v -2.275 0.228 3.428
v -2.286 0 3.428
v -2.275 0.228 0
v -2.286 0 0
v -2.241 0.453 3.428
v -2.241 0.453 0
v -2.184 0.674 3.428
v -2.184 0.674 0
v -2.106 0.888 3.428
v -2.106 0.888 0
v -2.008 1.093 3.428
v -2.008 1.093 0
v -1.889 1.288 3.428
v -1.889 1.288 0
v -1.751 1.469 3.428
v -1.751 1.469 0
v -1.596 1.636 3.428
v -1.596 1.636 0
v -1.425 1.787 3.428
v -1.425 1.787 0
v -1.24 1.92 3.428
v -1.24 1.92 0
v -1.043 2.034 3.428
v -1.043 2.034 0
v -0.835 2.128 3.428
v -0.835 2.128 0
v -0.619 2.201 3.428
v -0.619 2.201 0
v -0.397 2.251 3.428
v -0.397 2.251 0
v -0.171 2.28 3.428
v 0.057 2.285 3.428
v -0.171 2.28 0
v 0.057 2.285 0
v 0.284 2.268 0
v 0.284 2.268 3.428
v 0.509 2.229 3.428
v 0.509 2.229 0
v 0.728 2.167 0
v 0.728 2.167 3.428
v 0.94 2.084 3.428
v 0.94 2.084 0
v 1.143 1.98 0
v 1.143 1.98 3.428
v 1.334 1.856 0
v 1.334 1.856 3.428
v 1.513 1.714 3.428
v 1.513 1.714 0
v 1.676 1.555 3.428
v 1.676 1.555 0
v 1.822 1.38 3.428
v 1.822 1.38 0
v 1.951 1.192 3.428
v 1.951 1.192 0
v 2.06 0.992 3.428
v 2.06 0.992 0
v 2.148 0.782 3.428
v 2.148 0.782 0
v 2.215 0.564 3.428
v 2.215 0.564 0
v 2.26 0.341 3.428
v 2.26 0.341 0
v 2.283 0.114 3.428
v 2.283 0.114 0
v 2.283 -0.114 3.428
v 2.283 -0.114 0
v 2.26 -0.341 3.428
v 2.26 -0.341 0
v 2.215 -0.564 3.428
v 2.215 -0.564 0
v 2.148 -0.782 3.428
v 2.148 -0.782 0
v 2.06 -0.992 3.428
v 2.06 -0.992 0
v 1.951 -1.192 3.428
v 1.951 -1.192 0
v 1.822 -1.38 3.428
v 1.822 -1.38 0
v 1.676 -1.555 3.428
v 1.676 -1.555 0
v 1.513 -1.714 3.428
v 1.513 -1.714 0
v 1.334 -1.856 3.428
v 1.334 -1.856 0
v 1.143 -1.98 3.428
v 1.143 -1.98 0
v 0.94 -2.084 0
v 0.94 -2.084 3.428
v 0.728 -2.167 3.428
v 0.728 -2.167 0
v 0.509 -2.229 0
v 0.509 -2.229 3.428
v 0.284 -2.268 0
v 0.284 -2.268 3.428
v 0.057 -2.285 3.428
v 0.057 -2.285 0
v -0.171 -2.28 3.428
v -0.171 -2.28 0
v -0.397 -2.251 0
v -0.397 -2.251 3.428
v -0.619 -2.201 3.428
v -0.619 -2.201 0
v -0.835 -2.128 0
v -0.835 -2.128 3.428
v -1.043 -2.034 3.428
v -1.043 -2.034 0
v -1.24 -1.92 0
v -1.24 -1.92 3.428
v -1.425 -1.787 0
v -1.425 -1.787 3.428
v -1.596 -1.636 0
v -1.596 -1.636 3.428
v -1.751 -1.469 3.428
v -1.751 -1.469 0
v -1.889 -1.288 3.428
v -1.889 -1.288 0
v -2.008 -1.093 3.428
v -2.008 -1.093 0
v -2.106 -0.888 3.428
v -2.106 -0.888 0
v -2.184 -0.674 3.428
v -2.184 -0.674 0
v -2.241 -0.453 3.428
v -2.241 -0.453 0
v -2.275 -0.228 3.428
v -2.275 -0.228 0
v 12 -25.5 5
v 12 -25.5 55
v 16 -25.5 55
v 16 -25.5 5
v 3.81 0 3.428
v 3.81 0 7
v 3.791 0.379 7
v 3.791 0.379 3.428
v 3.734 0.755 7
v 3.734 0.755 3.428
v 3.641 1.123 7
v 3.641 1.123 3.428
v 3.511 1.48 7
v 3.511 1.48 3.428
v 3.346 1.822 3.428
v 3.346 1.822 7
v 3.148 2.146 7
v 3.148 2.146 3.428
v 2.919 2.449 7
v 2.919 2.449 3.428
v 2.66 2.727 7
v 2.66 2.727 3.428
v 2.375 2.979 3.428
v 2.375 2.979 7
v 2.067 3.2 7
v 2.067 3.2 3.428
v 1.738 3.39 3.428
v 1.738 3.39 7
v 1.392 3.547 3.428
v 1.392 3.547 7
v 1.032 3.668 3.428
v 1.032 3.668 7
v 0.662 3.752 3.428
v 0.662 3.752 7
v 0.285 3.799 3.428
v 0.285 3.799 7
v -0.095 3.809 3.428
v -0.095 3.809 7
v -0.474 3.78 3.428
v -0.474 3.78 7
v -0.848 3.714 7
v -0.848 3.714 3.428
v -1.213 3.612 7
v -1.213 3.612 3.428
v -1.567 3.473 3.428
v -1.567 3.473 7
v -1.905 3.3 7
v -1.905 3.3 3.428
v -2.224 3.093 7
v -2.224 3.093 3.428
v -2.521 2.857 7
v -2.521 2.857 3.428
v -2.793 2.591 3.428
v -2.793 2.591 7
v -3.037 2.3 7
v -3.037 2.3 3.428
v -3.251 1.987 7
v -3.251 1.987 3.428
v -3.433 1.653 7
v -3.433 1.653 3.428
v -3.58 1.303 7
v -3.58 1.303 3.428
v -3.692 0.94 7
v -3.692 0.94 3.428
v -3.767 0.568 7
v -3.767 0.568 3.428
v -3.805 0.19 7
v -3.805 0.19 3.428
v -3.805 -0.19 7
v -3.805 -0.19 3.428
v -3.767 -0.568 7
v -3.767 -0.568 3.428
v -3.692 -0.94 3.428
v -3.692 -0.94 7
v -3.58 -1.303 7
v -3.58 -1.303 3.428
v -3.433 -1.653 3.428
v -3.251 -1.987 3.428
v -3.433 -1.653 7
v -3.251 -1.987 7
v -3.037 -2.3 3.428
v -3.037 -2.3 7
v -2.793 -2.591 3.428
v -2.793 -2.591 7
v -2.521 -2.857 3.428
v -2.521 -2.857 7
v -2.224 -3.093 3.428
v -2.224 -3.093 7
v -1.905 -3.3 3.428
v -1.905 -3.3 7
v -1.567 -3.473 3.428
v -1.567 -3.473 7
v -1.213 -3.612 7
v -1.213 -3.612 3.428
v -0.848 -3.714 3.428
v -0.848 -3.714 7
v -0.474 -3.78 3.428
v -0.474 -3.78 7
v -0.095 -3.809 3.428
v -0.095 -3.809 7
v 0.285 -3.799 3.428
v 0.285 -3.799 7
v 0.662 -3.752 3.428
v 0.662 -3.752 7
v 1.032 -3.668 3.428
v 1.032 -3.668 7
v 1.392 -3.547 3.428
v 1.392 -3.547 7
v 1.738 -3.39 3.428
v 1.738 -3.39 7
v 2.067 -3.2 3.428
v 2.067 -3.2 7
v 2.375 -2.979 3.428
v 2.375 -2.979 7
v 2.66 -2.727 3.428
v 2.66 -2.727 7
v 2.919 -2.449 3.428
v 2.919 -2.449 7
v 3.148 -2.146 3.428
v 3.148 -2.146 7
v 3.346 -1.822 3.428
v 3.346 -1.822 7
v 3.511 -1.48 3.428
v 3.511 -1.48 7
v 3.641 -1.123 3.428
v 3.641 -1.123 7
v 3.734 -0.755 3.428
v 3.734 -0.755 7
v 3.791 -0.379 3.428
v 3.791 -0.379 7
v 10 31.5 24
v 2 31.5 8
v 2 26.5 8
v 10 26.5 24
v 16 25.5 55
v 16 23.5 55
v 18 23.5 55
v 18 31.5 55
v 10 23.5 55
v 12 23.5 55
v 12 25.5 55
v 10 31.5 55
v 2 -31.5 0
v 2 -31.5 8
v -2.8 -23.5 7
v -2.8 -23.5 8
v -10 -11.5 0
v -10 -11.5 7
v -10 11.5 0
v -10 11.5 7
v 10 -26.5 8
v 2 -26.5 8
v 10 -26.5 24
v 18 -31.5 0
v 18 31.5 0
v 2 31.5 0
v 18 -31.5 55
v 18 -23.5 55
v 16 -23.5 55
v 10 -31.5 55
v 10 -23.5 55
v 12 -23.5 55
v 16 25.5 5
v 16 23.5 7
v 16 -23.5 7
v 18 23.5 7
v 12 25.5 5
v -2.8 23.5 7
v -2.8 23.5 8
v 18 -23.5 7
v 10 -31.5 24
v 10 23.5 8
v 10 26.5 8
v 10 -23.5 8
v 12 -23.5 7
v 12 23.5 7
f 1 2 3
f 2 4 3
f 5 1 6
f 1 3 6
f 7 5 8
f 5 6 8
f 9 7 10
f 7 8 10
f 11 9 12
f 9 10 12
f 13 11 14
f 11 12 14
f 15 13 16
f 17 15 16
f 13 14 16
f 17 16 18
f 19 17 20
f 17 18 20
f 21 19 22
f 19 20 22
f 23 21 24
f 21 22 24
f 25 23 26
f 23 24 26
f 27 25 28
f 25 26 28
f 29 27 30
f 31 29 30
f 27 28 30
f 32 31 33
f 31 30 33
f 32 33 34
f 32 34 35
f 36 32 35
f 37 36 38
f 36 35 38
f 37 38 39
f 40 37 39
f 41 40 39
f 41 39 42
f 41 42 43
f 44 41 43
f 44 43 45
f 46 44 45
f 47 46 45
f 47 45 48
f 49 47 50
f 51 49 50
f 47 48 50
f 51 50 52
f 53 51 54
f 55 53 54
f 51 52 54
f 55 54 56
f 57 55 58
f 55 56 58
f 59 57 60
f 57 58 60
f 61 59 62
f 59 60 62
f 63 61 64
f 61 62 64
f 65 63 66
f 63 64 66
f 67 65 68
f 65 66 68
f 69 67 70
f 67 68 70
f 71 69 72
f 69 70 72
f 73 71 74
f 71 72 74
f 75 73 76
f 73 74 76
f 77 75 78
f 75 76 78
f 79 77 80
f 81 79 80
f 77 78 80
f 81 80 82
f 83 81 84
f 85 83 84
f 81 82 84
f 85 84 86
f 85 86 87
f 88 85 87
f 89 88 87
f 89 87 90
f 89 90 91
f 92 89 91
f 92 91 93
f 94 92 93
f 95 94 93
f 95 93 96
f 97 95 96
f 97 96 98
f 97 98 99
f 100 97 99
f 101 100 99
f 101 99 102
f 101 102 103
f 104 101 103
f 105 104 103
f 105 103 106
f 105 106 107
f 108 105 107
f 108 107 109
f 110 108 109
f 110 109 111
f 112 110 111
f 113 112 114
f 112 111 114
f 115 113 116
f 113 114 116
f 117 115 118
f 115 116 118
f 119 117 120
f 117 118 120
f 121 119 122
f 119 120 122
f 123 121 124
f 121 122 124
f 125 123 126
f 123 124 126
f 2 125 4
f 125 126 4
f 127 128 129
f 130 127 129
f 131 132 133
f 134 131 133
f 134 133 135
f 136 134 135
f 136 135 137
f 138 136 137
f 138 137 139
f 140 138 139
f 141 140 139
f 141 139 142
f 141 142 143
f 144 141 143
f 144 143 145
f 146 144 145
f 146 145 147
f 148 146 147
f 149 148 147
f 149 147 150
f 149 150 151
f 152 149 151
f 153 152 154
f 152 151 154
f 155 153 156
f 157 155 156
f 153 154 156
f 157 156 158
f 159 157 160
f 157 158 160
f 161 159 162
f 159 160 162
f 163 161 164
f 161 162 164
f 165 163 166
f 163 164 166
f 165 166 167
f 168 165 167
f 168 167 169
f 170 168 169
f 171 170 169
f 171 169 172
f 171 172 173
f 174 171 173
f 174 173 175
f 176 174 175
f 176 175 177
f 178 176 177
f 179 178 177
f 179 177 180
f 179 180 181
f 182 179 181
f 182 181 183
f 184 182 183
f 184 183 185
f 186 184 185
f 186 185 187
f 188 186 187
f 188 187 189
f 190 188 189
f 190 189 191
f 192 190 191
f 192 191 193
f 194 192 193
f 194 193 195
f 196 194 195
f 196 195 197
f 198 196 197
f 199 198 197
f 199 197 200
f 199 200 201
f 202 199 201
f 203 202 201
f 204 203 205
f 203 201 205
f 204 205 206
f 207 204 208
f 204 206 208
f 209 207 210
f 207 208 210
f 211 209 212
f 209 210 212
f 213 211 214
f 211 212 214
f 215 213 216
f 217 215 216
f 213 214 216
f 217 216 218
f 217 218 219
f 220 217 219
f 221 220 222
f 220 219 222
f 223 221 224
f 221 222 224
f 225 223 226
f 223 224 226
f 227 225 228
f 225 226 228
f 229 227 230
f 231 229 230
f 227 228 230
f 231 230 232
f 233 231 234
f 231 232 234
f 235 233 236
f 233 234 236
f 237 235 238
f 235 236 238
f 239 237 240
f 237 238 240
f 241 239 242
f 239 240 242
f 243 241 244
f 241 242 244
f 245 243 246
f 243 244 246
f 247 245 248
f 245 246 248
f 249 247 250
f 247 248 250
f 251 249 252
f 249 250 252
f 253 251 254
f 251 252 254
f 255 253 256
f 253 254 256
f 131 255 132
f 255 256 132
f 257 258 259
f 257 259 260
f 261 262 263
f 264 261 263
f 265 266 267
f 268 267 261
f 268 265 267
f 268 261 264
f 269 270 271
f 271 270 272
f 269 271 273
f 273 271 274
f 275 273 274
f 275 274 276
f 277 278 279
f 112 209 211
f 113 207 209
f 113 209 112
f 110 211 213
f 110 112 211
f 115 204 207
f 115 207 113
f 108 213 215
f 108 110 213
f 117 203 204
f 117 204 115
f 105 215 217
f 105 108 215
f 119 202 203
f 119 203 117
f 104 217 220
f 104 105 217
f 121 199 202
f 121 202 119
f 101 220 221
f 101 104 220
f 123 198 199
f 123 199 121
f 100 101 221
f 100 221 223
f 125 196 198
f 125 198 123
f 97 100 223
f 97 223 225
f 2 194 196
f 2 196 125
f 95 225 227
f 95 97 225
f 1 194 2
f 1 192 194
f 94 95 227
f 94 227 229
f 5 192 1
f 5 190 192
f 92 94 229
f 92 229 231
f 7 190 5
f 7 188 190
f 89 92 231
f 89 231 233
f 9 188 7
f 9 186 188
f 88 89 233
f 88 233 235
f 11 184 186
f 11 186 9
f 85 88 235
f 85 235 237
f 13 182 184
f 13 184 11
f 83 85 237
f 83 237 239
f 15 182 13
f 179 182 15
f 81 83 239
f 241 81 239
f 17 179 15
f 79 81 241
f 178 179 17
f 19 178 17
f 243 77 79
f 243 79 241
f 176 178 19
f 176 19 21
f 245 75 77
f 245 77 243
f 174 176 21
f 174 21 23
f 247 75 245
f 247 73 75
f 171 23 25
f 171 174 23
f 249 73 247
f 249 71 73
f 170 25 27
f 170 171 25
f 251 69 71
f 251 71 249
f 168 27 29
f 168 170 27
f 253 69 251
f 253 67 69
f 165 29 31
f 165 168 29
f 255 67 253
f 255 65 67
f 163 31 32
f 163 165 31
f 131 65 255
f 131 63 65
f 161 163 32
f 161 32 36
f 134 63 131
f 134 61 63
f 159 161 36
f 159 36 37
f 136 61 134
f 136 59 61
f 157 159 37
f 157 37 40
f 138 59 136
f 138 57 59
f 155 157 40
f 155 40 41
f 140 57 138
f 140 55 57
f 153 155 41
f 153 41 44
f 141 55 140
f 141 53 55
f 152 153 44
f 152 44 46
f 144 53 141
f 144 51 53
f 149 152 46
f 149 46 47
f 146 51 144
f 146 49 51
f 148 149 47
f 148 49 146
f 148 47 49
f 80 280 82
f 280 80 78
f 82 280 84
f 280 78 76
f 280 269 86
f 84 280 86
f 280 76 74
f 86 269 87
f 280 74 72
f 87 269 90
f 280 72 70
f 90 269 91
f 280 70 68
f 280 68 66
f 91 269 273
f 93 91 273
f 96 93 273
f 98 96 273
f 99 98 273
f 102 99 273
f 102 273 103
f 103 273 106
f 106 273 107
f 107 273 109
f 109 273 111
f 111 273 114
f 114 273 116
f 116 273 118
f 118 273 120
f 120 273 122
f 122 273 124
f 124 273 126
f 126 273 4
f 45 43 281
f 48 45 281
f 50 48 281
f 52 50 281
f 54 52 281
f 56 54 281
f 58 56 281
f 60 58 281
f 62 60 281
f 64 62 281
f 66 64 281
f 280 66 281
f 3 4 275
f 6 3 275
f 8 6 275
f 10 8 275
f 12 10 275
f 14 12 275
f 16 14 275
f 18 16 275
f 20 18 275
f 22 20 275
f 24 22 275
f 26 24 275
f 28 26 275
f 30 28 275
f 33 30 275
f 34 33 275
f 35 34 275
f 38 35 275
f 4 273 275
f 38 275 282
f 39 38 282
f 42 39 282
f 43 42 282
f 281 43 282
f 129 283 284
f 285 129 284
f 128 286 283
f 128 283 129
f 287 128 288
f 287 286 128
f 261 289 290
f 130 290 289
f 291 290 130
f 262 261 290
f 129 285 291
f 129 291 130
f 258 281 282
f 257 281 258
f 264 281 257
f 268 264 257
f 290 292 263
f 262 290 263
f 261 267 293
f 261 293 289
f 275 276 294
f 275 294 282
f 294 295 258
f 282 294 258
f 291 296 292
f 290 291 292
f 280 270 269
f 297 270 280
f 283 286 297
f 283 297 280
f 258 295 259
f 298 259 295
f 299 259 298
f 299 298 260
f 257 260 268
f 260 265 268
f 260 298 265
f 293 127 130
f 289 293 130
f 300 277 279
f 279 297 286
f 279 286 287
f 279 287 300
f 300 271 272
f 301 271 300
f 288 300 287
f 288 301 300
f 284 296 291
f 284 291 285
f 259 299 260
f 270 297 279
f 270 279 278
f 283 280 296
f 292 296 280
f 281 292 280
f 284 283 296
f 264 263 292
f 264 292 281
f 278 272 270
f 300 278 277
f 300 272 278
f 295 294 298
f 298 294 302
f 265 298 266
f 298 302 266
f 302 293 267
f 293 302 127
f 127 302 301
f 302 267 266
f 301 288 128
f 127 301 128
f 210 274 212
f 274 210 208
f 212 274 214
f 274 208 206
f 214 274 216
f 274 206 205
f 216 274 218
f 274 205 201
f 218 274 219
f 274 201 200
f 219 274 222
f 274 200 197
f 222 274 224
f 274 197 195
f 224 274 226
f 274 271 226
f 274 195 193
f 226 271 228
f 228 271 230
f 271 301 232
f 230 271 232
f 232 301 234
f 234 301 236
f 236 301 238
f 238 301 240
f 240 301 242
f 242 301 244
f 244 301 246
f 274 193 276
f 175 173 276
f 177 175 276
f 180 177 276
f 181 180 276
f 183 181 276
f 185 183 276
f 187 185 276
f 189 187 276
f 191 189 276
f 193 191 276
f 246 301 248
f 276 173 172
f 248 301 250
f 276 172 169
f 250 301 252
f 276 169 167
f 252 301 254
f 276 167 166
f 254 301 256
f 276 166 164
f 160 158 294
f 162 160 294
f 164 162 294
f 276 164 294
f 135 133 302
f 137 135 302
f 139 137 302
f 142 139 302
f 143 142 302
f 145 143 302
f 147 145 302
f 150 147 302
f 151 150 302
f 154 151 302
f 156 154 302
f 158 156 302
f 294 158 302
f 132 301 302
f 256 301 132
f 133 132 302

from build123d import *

# Parameters (mm, degrees)
F0_W           = 20
F0_H           = 63
F1_DEPTH       = 8
F2_W           = 63
F2_H           = 55
F3_DEPTH       = 8
F5_D           = 4.572
F5_CBORE_D     = 7.62
F5_CBORE_DEPTH = 4.572
F6_W           = 47
F6_H           = 48
F7_DEPTH       = 28.001
F9_W           = 4
F9_H           = 51
F10_DEPTH      = 50
F12_DEPTH      = 5
F14_DEPTH      = 5
F16_DEPTH      = 25


# Not quite as in the source:
# - a feature names something its author has since deleted; it is built from what else it names


with BuildPart() as f1:
    # F0 (on Top) → F1 (new body)
    with BuildSketch(Plane.XY):
        Rectangle(F0_W, F0_H)
    extrude(amount=F1_DEPTH)

    # F2 (on face) → F3 (join)
    with BuildSketch(Plane.YZ.offset(10)):
        with Locations((0, 27.5)):
            Rectangle(F2_W, F2_H)
    extrude(amount=F3_DEPTH)

    # F5 (through all)
    with Locations(Plane.XY.offset(8)):
        with Locations((0, 0)):
            CounterBoreHole(F5_D / 2, F5_CBORE_D / 2, F5_CBORE_DEPTH)

    # F6 (on face) → F7 (cut, through all)
    with BuildSketch(Plane.YZ.offset(18)):
        with Locations((0, 31)):
            Rectangle(F6_W, F6_H)
    extrude(amount=-F7_DEPTH, mode=Mode.SUBTRACT)

    # F9 (on 3pt) → F10 (cut)
    with BuildSketch(Plane(origin=(0, 0, 55), x_dir=(1, 0, 0), z_dir=(0, 0, -1))):
        with Locations((14, 0)):
            Rectangle(F9_W, F9_H)
    extrude(amount=F10_DEPTH, mode=Mode.SUBTRACT)

    # F11 (on face) → F12 (join)
    with BuildSketch(Plane.XZ.offset(31.5)):
        Polygon((2, 8), (10, 8), (10, 24), align=None)
    extrude(amount=-F12_DEPTH)

    # F13 (on face) → F14 (join)
    with BuildSketch(Plane(origin=(0, 31.5, 0), x_dir=(-1, 0, 0), z_dir=(0, 1, 0))):
        Polygon((-10, 24), (-10, 8), (-2, 8), align=None)
    extrude(amount=-F14_DEPTH)

    # F15 (on face) → F16 (cut)
    with BuildSketch(Plane.XY.offset(8)):
        Polygon((-10, 11.5), (2, 31.5), (-10, 31.5), align=None)
        Polygon((-10, -11.5), (-10, -31.5), (2, -31.5), align=None)
    extrude(amount=-F16_DEPTH, mode=Mode.SUBTRACT)


solid = f1.part
